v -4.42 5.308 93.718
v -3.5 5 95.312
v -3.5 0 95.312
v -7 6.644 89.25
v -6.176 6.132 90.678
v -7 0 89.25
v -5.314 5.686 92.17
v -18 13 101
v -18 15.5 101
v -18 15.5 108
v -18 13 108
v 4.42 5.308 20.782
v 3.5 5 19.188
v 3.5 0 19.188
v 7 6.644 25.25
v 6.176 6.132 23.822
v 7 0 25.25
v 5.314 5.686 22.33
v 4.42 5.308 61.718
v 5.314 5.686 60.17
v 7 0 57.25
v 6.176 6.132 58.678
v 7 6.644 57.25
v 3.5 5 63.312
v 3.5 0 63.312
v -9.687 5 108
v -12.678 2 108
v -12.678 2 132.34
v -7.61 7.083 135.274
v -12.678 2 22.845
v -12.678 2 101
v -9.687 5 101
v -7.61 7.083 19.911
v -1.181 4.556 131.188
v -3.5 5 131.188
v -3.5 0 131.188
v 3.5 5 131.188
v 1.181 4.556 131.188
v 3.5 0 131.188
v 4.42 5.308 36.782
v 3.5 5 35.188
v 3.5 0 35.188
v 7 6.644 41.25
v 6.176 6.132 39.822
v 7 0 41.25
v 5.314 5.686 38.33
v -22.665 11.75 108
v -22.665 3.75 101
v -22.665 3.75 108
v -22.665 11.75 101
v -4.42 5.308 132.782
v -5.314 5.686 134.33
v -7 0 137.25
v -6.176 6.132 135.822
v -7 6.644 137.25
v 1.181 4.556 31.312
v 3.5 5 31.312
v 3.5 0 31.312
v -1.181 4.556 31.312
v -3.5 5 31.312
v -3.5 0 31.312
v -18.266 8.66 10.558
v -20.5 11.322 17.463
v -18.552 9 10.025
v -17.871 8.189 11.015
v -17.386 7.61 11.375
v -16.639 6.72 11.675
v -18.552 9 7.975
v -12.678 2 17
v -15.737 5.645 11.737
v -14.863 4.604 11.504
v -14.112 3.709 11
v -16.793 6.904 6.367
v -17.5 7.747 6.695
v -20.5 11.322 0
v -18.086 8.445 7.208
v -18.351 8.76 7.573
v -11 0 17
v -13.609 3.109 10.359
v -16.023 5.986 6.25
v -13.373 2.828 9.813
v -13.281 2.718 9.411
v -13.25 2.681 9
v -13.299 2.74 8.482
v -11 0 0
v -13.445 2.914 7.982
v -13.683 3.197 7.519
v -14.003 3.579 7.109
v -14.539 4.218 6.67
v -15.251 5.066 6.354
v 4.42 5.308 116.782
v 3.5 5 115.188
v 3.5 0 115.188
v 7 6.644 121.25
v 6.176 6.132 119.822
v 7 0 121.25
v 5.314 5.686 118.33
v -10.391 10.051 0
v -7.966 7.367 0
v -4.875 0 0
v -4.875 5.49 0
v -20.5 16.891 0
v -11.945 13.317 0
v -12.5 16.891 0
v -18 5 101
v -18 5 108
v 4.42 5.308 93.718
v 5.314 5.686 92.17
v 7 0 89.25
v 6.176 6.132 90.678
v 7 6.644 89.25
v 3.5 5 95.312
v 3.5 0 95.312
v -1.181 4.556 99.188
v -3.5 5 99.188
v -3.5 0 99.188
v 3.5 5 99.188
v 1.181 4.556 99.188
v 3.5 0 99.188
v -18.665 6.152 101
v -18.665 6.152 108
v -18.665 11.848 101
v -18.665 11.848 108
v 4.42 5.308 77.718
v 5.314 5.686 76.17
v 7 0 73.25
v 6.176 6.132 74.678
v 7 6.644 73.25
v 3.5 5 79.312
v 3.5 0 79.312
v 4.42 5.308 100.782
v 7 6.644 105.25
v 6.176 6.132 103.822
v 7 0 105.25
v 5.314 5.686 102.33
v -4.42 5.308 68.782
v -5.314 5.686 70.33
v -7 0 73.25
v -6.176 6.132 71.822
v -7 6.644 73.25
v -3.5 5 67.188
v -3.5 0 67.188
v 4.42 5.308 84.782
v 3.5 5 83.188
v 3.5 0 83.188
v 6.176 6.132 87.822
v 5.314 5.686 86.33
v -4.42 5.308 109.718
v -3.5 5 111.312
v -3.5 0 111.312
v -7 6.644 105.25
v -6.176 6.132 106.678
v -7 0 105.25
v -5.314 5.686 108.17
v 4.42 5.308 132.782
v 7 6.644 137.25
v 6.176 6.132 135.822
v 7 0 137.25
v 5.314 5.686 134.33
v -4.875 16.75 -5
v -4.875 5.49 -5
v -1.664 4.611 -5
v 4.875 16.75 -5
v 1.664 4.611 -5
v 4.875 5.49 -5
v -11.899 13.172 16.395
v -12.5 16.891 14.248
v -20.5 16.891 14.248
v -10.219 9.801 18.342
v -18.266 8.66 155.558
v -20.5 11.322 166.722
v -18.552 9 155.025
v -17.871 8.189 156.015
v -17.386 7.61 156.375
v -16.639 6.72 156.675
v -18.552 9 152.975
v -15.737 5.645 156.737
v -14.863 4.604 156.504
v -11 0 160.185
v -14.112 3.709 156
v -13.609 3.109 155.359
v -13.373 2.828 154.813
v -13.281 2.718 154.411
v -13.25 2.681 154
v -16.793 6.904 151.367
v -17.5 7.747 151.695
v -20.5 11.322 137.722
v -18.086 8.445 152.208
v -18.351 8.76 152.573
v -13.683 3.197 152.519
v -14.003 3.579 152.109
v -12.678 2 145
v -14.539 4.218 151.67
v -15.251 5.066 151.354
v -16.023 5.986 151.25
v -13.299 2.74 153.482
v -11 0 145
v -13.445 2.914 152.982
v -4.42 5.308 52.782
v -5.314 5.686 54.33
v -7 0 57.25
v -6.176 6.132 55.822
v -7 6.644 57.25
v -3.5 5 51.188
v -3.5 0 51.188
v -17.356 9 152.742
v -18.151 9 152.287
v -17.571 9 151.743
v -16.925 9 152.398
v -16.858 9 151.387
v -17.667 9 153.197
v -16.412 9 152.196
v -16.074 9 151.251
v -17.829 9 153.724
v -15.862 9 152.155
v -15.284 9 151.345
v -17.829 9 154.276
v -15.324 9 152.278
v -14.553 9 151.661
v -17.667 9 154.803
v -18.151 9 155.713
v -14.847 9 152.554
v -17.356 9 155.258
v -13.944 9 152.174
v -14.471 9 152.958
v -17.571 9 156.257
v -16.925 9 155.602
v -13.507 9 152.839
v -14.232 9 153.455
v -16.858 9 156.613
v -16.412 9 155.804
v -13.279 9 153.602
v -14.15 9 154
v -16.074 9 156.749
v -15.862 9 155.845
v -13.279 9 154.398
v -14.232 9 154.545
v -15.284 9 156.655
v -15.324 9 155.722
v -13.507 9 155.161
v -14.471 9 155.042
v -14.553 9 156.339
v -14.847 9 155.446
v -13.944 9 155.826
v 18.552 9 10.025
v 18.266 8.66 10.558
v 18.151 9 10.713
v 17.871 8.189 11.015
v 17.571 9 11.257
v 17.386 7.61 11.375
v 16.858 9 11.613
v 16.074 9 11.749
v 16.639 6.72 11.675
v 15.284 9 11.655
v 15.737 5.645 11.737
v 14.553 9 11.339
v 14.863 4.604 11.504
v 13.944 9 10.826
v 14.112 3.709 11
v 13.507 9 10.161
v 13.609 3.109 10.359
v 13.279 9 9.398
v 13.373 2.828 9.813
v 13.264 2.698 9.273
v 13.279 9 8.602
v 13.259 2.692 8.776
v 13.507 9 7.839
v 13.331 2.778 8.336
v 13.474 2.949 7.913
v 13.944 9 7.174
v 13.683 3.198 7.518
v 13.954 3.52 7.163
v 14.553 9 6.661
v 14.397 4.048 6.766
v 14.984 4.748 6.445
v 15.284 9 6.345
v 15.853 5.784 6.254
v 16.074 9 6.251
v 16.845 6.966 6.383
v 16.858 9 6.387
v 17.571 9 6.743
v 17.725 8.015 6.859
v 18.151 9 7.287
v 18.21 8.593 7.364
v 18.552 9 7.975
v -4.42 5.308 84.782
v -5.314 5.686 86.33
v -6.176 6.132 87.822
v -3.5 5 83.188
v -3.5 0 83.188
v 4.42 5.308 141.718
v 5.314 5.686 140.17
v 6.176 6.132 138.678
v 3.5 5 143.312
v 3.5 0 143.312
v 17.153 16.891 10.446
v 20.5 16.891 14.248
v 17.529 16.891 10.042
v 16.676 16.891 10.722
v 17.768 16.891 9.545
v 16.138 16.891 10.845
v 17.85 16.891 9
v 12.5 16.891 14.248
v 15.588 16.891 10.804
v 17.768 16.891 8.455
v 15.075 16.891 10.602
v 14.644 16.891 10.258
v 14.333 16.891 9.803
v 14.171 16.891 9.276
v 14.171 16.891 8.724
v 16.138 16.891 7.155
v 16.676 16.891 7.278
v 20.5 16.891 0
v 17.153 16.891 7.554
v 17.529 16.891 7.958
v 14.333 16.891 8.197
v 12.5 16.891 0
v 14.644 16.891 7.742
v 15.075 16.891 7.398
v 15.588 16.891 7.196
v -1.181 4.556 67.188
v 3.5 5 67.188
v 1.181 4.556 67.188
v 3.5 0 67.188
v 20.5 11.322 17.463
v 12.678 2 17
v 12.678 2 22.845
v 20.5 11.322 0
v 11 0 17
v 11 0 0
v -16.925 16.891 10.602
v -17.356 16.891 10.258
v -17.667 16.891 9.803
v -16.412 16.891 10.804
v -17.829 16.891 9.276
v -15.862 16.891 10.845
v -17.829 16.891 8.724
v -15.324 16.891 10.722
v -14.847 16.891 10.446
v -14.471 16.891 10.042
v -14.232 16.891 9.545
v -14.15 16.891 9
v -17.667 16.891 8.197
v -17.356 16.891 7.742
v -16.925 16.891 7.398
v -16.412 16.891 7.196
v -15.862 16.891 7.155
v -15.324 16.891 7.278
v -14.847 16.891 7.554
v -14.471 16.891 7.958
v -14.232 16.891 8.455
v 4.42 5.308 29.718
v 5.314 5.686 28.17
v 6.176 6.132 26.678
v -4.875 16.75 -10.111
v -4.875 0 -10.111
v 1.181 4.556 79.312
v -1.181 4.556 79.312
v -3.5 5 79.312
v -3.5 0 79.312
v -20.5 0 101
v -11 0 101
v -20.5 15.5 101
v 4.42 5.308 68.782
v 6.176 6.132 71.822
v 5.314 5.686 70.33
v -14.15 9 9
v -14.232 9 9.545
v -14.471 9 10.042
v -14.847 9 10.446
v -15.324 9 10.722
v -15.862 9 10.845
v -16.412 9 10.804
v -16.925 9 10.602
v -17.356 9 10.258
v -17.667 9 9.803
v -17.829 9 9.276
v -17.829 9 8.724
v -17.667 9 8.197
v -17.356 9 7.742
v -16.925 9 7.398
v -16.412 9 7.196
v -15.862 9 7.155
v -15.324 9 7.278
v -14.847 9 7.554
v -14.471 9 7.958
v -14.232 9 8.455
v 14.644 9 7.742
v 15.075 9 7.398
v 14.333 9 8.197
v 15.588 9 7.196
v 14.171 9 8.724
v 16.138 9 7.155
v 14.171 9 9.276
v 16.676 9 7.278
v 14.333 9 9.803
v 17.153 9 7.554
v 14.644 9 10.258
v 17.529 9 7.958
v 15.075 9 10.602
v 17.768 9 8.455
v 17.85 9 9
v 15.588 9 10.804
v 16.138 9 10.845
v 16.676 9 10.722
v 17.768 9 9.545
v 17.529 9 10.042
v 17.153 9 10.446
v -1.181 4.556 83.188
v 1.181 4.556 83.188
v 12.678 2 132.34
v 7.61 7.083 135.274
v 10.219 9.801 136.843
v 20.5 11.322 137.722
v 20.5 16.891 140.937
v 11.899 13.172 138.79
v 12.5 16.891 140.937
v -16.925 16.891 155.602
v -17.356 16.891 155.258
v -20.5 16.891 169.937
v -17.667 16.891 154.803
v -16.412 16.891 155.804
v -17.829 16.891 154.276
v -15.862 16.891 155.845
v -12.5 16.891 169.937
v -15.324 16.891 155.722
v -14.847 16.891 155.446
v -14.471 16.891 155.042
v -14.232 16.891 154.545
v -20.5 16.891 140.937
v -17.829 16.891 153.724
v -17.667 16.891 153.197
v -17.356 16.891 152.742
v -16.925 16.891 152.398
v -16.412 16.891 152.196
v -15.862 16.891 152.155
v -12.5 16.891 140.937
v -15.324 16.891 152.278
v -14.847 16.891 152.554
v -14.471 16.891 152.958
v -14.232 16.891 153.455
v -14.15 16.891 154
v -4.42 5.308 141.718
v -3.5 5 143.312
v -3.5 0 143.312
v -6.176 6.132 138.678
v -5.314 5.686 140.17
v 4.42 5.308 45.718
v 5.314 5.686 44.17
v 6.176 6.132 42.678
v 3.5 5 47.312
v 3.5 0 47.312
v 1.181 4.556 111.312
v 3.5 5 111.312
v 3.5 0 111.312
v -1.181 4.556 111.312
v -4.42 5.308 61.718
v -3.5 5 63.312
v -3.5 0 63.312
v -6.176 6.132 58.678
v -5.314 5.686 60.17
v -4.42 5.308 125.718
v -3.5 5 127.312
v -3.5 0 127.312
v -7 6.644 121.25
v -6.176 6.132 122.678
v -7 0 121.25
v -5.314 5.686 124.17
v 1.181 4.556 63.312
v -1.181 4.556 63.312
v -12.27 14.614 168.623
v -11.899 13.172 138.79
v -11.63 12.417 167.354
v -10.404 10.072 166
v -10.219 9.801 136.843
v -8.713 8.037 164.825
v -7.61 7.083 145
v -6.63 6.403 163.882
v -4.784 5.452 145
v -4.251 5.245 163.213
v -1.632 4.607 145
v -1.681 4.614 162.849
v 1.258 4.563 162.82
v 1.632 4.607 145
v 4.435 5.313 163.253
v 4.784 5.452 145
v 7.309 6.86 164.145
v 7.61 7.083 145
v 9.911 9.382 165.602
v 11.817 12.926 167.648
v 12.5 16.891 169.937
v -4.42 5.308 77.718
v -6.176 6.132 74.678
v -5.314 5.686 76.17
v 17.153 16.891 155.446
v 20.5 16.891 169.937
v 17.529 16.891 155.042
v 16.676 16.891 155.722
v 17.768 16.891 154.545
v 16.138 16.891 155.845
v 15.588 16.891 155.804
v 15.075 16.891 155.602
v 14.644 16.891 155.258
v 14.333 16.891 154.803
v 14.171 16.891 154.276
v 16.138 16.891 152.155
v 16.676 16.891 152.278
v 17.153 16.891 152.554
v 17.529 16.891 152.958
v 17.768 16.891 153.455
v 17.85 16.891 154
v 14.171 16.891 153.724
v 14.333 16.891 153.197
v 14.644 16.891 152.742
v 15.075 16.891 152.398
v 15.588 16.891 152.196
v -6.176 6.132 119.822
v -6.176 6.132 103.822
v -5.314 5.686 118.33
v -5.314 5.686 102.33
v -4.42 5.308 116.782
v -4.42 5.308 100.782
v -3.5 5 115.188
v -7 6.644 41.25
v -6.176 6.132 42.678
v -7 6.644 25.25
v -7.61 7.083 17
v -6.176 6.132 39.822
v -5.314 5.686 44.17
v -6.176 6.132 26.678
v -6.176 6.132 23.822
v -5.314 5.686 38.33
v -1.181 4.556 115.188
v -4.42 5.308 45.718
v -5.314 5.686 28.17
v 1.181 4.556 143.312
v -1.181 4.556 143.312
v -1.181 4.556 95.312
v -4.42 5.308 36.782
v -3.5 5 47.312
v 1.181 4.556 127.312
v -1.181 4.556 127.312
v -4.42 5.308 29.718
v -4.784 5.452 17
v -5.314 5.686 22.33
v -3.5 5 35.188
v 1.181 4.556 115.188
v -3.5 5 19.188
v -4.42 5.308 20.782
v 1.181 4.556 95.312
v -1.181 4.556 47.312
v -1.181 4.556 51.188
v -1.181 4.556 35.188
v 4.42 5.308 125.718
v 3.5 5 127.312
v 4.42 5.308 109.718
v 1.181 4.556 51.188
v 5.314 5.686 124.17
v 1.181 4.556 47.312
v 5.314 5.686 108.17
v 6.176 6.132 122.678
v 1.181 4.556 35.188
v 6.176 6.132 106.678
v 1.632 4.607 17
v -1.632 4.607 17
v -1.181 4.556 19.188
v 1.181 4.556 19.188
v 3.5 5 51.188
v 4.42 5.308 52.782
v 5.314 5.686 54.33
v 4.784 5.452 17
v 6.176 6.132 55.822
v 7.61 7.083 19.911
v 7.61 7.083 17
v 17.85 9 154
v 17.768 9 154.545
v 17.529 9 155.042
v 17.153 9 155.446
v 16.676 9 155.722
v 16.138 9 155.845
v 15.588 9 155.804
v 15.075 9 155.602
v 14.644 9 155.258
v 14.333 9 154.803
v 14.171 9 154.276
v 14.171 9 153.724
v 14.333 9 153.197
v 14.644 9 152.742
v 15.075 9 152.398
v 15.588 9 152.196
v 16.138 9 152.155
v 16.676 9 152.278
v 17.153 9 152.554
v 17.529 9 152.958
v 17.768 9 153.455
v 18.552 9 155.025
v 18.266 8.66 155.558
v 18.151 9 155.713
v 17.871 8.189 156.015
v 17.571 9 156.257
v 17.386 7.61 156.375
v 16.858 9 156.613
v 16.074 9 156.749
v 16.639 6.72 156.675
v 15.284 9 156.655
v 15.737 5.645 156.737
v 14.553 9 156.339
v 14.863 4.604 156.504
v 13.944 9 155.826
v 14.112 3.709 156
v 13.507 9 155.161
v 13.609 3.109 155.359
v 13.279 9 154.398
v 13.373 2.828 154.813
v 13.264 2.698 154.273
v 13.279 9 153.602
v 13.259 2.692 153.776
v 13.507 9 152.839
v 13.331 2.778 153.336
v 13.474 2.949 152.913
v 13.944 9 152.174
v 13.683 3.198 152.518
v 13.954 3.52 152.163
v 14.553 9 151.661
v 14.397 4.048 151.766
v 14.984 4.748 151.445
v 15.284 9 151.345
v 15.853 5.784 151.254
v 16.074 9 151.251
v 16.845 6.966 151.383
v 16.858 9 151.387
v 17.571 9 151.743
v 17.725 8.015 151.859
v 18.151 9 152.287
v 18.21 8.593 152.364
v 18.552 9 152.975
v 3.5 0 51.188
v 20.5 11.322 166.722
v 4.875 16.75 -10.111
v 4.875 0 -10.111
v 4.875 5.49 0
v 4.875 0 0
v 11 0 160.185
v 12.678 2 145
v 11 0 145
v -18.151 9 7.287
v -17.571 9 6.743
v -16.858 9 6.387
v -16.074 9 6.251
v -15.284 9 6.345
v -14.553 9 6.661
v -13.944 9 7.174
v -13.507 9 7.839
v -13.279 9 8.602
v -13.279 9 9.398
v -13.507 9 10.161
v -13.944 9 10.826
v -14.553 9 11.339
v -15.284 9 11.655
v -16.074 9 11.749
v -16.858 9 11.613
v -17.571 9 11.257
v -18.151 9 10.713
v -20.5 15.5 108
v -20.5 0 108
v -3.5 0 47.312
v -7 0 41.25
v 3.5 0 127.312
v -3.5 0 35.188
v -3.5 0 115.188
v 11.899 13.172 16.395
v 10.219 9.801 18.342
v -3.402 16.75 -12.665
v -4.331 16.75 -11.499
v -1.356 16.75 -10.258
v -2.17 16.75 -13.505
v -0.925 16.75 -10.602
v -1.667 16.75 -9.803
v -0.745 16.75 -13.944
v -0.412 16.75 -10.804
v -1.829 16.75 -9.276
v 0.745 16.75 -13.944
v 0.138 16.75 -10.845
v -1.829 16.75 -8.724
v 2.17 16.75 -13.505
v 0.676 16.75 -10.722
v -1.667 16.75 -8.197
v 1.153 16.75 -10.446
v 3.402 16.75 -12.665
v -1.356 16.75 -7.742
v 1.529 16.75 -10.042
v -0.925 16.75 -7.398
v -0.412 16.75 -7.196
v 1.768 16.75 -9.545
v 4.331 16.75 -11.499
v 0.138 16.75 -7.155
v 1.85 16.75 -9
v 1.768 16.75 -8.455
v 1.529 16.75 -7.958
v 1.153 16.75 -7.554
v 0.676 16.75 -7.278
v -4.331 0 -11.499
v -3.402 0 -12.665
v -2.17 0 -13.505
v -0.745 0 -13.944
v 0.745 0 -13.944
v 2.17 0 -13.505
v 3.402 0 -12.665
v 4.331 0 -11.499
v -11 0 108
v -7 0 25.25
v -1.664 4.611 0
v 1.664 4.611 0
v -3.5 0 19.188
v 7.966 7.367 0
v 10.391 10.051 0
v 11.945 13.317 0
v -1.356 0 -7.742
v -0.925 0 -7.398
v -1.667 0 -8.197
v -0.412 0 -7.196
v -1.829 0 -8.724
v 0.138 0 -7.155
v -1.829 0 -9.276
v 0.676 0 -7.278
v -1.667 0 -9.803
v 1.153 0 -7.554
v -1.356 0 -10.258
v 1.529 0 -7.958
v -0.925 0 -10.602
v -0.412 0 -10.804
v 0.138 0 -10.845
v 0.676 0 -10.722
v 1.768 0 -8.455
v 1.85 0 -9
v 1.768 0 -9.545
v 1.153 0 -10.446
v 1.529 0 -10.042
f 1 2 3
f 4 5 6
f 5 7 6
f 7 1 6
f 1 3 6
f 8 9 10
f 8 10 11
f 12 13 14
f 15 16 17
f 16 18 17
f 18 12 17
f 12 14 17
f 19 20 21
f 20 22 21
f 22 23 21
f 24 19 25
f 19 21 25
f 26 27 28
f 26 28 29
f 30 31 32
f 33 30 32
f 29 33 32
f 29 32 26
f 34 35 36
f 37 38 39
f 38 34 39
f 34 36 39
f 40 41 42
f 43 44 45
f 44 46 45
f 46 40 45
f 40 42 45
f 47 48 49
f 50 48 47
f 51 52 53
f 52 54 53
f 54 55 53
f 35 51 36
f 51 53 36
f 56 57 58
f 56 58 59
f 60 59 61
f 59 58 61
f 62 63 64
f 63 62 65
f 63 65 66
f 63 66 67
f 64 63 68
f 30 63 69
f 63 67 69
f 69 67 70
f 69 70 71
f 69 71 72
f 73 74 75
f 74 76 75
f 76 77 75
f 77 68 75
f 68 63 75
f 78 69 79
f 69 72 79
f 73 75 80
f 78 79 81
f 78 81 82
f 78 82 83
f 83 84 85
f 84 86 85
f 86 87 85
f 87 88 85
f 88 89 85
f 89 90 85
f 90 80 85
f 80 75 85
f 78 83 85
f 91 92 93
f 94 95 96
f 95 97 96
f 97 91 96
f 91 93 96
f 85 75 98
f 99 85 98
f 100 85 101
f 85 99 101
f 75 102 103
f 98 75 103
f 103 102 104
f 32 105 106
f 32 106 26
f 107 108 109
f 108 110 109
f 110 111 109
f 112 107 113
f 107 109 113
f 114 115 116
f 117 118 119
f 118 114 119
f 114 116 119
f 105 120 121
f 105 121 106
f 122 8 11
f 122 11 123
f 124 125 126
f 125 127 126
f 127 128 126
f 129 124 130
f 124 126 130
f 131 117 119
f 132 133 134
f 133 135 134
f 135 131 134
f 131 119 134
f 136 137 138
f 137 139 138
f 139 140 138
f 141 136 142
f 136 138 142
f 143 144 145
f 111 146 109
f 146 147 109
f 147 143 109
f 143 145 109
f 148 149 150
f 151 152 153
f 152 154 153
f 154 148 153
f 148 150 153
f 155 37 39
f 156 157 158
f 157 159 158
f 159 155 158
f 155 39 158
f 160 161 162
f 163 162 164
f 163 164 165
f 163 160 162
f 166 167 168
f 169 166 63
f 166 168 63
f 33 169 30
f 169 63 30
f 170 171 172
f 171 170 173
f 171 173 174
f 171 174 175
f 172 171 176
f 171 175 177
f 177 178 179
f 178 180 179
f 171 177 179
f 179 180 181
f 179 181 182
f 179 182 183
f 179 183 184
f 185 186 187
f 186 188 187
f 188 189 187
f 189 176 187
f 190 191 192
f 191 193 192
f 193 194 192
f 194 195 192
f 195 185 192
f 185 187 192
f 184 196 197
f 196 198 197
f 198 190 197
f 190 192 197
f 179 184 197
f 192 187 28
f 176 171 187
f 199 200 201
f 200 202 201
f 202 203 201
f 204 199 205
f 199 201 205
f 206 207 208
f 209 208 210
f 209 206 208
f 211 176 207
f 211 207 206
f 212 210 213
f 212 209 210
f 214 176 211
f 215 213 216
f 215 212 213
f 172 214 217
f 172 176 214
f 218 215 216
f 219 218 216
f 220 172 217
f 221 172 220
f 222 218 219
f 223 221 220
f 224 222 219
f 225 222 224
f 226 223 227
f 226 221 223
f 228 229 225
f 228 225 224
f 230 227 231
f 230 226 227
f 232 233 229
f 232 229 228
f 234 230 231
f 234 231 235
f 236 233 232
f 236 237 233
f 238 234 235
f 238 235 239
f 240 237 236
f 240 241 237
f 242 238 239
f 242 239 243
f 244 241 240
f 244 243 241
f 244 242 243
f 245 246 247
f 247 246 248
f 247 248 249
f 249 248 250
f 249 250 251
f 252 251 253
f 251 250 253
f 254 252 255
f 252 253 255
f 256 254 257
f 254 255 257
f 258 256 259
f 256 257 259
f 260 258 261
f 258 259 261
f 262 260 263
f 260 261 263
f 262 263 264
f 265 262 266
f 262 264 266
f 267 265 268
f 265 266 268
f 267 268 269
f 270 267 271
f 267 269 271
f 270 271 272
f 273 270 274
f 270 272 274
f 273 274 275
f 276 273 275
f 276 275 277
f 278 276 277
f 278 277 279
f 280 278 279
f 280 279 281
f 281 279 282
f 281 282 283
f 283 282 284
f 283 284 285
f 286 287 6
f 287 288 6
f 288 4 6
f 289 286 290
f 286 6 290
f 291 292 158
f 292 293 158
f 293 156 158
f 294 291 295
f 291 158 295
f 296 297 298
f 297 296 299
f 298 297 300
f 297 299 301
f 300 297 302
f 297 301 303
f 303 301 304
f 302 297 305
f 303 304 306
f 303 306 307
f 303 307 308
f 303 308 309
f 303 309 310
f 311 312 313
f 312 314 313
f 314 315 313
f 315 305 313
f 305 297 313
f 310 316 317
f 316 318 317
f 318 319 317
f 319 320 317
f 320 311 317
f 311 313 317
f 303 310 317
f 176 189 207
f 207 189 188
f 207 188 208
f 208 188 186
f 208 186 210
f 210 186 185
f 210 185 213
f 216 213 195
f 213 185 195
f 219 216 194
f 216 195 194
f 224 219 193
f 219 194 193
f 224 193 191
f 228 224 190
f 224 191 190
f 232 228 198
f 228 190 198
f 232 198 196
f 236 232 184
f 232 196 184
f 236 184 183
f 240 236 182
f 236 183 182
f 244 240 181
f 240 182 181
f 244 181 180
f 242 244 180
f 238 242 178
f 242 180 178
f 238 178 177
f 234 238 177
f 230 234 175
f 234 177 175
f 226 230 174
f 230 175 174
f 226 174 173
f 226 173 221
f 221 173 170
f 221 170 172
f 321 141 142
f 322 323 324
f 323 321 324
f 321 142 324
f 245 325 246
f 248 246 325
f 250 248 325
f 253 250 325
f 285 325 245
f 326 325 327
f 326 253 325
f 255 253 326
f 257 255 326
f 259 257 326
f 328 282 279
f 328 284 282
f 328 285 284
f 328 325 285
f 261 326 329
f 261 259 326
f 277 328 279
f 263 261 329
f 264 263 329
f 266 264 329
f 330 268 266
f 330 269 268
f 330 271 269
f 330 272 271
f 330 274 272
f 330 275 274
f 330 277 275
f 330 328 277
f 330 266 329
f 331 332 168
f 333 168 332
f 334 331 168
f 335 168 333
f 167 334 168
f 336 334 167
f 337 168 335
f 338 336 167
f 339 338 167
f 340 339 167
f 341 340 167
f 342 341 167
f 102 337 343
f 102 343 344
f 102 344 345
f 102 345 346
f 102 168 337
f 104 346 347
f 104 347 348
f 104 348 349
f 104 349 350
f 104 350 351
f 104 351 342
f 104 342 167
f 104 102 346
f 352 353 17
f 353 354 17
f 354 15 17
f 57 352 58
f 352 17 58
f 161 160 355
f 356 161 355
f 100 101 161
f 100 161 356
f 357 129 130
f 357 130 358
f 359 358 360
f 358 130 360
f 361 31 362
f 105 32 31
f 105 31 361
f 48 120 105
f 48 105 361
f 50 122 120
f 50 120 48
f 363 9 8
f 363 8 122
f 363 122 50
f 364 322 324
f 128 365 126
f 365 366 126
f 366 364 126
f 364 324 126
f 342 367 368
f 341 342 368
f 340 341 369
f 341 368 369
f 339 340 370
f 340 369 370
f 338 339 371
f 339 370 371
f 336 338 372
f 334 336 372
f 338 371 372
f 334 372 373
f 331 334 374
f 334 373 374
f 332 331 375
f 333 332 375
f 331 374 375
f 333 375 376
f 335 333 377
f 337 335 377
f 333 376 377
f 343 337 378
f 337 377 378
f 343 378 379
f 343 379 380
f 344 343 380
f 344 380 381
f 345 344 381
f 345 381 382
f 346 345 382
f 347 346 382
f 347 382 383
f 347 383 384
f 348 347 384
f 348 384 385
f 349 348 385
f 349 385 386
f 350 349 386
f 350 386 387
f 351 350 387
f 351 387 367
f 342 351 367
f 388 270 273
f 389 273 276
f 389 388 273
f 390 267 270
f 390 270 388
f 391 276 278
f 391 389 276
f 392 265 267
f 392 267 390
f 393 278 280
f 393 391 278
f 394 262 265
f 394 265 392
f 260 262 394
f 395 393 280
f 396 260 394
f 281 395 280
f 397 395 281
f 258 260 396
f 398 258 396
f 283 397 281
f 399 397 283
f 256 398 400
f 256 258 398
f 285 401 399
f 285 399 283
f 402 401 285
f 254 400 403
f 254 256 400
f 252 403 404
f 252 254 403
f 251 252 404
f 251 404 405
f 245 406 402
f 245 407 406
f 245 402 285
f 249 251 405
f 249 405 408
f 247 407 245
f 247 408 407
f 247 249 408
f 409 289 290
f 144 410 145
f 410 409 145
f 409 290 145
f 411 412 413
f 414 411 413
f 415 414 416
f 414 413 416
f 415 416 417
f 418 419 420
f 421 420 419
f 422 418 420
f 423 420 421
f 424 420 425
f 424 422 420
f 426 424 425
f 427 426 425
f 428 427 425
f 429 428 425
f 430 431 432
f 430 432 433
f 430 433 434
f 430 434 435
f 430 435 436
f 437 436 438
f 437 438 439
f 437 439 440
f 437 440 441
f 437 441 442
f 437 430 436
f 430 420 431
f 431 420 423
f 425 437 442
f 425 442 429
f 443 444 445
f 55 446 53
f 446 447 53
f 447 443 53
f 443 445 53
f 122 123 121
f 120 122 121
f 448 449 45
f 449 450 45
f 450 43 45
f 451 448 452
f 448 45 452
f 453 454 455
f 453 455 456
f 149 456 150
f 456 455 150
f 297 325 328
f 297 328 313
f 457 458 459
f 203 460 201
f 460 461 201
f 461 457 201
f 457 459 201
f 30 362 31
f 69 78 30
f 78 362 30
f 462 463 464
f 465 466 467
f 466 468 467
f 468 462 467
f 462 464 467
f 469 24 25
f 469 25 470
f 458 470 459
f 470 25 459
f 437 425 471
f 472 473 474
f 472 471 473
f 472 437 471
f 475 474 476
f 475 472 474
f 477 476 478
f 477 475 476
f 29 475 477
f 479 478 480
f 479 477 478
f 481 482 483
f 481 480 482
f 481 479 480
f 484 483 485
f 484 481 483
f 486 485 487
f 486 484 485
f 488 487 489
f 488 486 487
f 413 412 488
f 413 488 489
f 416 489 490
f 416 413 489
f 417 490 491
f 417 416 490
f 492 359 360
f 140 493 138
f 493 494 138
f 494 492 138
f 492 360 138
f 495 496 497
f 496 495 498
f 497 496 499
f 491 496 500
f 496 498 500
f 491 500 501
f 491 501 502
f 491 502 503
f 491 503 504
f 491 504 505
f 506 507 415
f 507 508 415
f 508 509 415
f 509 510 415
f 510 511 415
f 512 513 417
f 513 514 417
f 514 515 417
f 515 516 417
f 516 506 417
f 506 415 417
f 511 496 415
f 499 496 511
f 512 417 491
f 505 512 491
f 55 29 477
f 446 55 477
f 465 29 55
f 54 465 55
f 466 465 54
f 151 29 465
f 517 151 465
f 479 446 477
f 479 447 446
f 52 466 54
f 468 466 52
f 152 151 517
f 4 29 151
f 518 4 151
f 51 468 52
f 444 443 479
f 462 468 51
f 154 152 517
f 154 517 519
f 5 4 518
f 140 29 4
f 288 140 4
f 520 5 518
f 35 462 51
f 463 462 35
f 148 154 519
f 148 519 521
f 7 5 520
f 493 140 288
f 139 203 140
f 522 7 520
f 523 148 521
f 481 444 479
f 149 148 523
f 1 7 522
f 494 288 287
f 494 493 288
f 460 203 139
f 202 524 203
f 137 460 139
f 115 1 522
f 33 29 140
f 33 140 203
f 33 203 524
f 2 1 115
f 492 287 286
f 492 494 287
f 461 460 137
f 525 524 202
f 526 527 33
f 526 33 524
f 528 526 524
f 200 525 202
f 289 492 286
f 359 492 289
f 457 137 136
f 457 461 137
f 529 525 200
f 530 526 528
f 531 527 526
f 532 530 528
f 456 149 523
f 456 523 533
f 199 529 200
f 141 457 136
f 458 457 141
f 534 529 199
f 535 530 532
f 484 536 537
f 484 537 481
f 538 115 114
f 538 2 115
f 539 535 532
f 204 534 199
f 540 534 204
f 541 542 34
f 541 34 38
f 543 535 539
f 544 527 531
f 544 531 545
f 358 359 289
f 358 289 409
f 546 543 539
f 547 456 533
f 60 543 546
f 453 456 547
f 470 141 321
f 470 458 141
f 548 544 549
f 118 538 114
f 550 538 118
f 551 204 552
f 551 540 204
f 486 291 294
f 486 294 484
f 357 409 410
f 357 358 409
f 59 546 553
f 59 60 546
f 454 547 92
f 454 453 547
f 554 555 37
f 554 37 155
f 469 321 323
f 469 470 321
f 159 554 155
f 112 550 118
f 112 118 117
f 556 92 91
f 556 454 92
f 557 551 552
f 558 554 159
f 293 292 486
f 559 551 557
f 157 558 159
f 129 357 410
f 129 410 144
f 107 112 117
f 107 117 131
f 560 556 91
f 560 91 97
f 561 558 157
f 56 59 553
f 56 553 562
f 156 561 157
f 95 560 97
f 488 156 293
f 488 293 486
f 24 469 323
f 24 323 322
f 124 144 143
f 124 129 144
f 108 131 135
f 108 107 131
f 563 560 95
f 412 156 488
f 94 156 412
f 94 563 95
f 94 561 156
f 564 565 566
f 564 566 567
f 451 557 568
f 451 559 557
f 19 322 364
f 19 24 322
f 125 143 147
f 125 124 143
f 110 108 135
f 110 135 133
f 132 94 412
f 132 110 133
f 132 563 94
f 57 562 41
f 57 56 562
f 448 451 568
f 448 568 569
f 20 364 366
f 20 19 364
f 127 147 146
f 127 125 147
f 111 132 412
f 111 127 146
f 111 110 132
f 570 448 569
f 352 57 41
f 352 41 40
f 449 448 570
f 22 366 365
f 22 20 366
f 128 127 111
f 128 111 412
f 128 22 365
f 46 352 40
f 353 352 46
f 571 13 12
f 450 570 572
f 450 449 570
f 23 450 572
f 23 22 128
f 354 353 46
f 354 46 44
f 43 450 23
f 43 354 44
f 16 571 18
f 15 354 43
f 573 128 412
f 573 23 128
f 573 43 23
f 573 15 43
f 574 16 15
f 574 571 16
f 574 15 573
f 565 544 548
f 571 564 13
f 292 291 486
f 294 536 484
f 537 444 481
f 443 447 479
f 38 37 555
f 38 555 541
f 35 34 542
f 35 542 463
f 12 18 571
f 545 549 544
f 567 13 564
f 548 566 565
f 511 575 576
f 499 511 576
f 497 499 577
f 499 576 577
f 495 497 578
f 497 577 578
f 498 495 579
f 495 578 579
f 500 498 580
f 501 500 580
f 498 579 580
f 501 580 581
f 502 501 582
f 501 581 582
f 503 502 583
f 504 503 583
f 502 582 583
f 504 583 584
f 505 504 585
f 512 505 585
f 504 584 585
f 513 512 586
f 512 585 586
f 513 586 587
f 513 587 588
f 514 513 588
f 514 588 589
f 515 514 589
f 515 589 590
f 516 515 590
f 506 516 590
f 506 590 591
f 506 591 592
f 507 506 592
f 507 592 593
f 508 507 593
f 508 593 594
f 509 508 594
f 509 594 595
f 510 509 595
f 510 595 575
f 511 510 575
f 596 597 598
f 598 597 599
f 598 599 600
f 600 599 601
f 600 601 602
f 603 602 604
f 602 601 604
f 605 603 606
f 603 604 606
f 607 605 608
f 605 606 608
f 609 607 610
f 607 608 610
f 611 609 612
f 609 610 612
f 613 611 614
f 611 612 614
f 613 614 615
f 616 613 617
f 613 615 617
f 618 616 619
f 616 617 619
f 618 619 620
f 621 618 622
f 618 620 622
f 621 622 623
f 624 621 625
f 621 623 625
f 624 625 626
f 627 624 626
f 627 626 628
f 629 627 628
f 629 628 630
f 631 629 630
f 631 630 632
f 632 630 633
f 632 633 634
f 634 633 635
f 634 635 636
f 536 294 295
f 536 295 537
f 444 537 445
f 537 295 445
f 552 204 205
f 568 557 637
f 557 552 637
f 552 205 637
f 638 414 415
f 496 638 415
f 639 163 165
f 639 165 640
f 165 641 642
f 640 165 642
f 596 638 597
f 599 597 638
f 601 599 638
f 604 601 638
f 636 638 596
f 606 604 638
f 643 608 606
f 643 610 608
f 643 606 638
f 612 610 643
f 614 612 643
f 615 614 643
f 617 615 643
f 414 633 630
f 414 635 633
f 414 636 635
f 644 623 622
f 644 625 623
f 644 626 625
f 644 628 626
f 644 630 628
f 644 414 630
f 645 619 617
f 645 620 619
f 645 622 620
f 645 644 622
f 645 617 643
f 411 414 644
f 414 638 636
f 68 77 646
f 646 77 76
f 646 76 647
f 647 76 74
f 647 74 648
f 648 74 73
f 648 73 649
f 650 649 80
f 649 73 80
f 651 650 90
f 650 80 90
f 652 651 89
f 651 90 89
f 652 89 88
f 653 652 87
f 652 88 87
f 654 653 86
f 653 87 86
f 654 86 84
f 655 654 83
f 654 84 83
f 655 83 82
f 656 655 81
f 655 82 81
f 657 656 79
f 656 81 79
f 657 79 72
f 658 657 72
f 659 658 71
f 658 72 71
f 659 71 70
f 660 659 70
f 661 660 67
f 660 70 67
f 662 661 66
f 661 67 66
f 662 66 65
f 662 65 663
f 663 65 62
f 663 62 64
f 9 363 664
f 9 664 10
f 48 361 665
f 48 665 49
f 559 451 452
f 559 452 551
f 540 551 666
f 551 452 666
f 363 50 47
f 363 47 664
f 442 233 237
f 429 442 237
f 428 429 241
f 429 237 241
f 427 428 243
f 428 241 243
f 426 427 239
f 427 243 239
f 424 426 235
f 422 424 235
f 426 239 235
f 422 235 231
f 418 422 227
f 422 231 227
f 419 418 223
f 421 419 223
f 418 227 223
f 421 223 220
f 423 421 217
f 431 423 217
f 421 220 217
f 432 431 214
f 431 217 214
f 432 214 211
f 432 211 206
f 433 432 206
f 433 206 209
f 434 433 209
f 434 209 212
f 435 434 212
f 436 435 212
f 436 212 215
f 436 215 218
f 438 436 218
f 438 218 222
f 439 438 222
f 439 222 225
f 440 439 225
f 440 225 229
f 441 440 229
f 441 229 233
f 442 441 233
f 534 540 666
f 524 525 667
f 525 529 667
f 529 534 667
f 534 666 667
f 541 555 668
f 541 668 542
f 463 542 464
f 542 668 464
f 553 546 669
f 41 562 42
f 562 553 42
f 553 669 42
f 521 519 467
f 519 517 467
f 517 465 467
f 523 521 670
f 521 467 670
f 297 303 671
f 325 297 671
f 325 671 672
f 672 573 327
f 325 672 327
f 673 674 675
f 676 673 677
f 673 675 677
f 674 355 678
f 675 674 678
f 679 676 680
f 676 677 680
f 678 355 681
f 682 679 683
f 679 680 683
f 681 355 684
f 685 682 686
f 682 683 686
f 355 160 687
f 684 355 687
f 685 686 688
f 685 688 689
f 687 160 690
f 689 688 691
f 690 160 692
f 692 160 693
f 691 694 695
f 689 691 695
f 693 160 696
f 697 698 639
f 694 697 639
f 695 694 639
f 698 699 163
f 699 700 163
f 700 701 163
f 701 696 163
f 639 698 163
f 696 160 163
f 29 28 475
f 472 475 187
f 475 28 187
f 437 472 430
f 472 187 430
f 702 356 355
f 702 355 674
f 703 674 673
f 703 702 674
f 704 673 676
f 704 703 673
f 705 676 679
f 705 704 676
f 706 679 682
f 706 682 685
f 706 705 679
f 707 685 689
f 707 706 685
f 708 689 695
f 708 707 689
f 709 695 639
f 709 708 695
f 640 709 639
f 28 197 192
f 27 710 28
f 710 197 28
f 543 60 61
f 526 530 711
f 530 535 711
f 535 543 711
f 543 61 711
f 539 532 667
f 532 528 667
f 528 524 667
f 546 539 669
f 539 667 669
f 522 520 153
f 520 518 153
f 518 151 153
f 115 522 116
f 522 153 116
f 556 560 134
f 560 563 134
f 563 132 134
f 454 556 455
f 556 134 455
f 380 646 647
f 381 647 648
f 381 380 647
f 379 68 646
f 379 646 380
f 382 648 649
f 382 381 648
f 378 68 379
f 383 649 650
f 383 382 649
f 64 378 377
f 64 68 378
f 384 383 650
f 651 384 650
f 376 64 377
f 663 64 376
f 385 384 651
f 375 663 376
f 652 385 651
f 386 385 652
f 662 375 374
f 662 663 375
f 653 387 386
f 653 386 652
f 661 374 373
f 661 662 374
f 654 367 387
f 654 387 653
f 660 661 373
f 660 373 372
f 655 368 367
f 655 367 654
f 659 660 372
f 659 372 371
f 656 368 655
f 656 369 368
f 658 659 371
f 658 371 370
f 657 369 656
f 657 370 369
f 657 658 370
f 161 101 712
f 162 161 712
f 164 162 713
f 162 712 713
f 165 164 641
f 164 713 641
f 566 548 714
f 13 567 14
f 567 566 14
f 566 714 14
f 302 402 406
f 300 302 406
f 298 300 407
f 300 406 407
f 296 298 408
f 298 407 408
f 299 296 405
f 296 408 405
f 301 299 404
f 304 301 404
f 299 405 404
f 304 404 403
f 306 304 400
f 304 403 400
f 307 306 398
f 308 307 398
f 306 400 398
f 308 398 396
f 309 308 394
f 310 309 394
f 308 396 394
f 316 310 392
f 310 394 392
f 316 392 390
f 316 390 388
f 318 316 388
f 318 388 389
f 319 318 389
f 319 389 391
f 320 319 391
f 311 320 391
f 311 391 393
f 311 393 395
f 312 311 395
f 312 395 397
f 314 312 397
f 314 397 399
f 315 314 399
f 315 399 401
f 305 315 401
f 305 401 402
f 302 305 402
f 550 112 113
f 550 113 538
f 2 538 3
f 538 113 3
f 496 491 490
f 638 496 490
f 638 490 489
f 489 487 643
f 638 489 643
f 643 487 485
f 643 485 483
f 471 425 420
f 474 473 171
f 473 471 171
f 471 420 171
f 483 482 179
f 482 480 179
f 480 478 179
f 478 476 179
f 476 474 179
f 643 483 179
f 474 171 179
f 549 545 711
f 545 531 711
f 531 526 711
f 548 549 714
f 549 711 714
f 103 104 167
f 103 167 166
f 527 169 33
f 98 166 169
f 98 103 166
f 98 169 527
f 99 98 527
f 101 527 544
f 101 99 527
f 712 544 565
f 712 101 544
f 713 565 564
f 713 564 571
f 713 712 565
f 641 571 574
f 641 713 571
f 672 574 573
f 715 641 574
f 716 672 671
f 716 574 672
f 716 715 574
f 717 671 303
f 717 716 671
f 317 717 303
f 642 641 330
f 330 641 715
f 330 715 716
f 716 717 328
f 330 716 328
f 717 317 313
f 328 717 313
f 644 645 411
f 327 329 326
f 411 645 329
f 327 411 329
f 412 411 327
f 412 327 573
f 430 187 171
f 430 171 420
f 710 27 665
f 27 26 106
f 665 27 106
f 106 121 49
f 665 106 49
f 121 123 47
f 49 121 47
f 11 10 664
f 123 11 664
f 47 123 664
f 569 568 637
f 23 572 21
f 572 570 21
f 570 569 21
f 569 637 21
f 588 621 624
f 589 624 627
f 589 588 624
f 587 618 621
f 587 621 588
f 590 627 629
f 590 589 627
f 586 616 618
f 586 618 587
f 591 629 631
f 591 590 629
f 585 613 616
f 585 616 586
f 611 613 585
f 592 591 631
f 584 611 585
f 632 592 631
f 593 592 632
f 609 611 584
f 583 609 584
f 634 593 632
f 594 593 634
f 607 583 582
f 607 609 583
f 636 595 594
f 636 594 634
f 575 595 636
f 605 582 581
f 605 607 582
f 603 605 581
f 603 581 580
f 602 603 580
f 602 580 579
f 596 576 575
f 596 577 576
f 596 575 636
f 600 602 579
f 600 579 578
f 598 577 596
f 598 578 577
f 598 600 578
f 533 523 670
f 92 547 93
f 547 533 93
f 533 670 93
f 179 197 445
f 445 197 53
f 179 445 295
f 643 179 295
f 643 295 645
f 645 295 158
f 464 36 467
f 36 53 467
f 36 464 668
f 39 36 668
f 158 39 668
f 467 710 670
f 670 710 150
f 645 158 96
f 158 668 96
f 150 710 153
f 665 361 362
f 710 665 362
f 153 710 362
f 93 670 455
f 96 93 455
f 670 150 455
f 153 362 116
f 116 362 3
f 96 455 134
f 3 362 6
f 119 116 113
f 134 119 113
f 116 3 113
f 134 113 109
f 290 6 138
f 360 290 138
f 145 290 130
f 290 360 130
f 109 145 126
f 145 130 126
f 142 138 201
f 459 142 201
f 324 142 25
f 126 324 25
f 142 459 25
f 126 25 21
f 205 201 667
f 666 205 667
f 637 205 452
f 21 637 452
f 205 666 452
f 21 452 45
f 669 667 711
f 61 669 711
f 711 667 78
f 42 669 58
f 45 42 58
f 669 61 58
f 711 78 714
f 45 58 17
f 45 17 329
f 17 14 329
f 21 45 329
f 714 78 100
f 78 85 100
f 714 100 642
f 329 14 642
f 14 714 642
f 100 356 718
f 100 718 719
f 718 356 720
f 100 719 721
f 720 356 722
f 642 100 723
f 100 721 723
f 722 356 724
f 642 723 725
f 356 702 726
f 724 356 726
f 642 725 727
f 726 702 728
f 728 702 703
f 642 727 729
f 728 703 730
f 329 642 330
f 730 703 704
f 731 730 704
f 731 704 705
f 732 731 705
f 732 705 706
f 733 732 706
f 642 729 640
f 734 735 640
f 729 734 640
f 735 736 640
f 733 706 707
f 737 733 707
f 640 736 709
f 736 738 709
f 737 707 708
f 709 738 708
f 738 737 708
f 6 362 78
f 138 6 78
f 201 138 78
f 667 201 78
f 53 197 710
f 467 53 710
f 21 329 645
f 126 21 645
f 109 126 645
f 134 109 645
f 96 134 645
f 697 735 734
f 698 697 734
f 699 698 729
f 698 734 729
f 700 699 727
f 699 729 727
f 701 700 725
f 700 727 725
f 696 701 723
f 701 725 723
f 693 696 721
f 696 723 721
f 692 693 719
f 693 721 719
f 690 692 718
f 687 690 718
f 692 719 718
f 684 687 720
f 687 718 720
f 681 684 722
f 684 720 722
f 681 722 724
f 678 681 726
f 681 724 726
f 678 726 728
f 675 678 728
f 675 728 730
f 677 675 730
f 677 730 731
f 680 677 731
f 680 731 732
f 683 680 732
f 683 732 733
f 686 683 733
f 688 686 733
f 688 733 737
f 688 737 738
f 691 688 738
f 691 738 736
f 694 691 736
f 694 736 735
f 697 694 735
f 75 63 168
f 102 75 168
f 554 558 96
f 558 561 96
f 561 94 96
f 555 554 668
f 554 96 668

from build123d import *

# Parameters (mm, degrees)
SKETCH218_AS_DRAWN_R                    = 1.85
EXTRUDE136003_DEPTH                     = 20
EXTRUDE136003_ONTO_SKETCH218_ROLL_ANGLE = 90
EXTRUDE136010_DEPTH                     = 50
SKETCH221_AS_DRAWN_R                    = 2.75
EXTRUDE136006_DEPTH                     = 9
EXTRUDE136006_ONTO_SKETCH221_ROLL_ANGLE = 90
SKETCH220_AS_DRAWN_R                    = 1.85
EXTRUDE136005_DEPTH                     = 20
EXTRUDE136005_ONTO_SKETCH220_ROLL_ANGLE = 90
EXTRUDE136004_DEPTH                     = 38
EXTRUDE136011_DEPTH                     = 50
SKETCH224_AS_DRAWN_R                    = 2.75
EXTRUDE136009_DEPTH                     = 9
EXTRUDE136009_ONTO_SKETCH224_ROLL_ANGLE = 90
SKETCH223_AS_DRAWN_R                    = 1.85
EXTRUDE136008_DEPTH                     = 20
EXTRUDE136008_ONTO_SKETCH223_ROLL_ANGLE = 90
EXTRUDE136007_DEPTH                     = 24
EXTRUDE136012_DEPTH                     = 14
SKETCH227_W                             = 9.75
SKETCH227_H                             = 16.75
EXTRUDE136013_DEPTH                     = 9
EXTRUDE136014_DEPTH                     = 7
EXTRUDE136002_DEPTH                     = 128


with BuildPart() as extrude136003:
    # Sketch218 as drawn → Extrude136003 (new)
    with BuildSketch(Plane.XY):
        with Locations((0, -9)):
            Circle(SKETCH218_AS_DRAWN_R)
        Polygon((3.5, 19.187822), (7, 25.25), (3.5, 31.312178), (-3.5, 31.312178), (-7, 25.25), (-3.5, 19.187822), align=None)
        Polygon((3.5, 35.187822), (7, 41.25), (3.5, 47.312178), (-3.5, 47.312178), (-7, 41.25), (-3.5, 35.187822), align=None)
        Polygon((3.5, 51.187822), (7, 57.25), (3.5, 63.312178), (-3.5, 63.312178), (-7, 57.25), (-3.5, 51.187822), align=None)
        Polygon((3.5, 67.187822), (7, 73.25), (3.5, 79.312178), (-3.5, 79.312178), (-7, 73.25), (-3.5, 67.187822), align=None)
        Polygon((3.5, 83.187822), (7, 89.25), (3.5, 95.312178), (-3.5, 95.312178), (-7, 89.25), (-3.5, 83.187822), align=None)
        Polygon((3.5, 99.187822), (7, 105.25), (3.5, 111.312178), (-3.5, 111.312178), (-7, 105.25), (-3.5, 99.187822), align=None)
        Polygon((3.5, 115.187822), (7, 121.25), (3.5, 127.312178), (-3.5, 127.312178), (-7, 121.25), (-3.5, 115.187822), align=None)
        Polygon((3.5, 131.187822), (7, 137.25), (3.5, 143.312178), (-3.5, 143.312178), (-7, 137.25), (-3.5, 131.187822), align=None)
        with BuildLine():
            Line((5, -8.999981), (5, -15.999981))
            Line((5, -15.999981), (-5, -15.999981))
            Line((-5, -15.999981), (-5, -8.999981))
            ThreePointArc((-5, -8.999981), (0, -14), (5, -8.999981))
        make_face()
    extrude(amount=-EXTRUDE136003_DEPTH)


with BuildPart() as extrude136003_1:
    # Extrude136003 onto Sketch218 roll: moved
    add(extrude136003.part.rotate(Axis((0, 0, 0), (1, 0, 0)), EXTRUDE136003_ONTO_SKETCH218_ROLL_ANGLE))


with BuildPart() as extrude136003_2:
    # Extrude136003 onto Sketch218 placement: moved
    add(extrude136003_1.part)


with BuildPart() as extrude136010:
    # Sketch225 → Extrude136010 (new body)
    with BuildSketch(Plane.YZ):
        Polygon((0, -9.814955), (17, 0), (17, -9.814955), align=None)
        Polygon((17, 29), (0, 19.185045), (0, 29), align=None)
    extrude(amount=EXTRUDE136010_DEPTH)


with BuildPart() as extrude136010_1:
    # Extrude136010 placement: moved
    add(extrude136010.part.moved(Location((-25, 0, 0))))


with BuildPart() as extrude136006:
    # Sketch221 as drawn → Extrude136006 (new)
    with BuildSketch(Plane.XY):
        with Locations((-16, 0)):
            Circle(SKETCH221_AS_DRAWN_R)
        with Locations((16, 0)):
            Circle(SKETCH221_AS_DRAWN_R)
    extrude(amount=-EXTRUDE136006_DEPTH)


with BuildPart() as extrude136006_1:
    # Extrude136006 onto Sketch221 roll: moved
    add(extrude136006.part.rotate(Axis((0, 0, 0), (1, 0, 0)), EXTRUDE136006_ONTO_SKETCH221_ROLL_ANGLE))


with BuildPart() as extrude136006_2:
    # Extrude136006 onto Sketch221 placement: moved
    add(extrude136006_1.part)


with BuildPart() as fusion034004041035:
    # Sketch220 as drawn → Extrude136005 (new)
    with BuildSketch(Plane.XY):
        with Locations((-16, 0)):
            Circle(SKETCH220_AS_DRAWN_R)
        with Locations((16, 0)):
            Circle(SKETCH220_AS_DRAWN_R)
    extrude(amount=-EXTRUDE136005_DEPTH)


with BuildPart() as fusion034004041035_1:
    # Extrude136005 onto Sketch220 roll: moved
    add(fusion034004041035.part.rotate(Axis((0, 0, 0), (1, 0, 0)), EXTRUDE136005_ONTO_SKETCH220_ROLL_ANGLE))


with BuildPart() as fusion034004041035_2:
    # Extrude136005 onto Sketch220 placement: moved
    add(fusion034004041035_1.part)

    # Fusion034004041033: union Extrude136006
    add(extrude136006_2.part)


with BuildPart() as fusion034004041035_3:
    # Fusion034004041033 placement: moved
    add(fusion034004041035_2.part.moved(Location((0, 0, 13))))

    # Fusion034004041035: union Extrude136010
    add(extrude136010_1.part)


with BuildPart() as cut009010006006004:
    # Sketch219 → Extrude136004 (new body)
    with BuildSketch(Plane.XY):
        with BuildLine():
            Line((-11, 0), (11, 0))
            Line((20.5, 11.321659), (11, 0))
            Line((20.5, 11.321659), (20.5, 16.890918))
            Line((20.5, 16.890918), (12.499524, 16.890918))
            ThreePointArc((-12.499524, 16.890918), (0, 4.5), (12.499524, 16.890918))
            Line((-20.5, 16.890918), (-12.499524, 16.890918))
            Line((-20.5, 11.321659), (-20.5, 16.890918))
            Line((-20.5, 11.321659), (-11, 0))
        make_face()
    extrude(amount=EXTRUDE136004_DEPTH)


with BuildPart() as cut009010006006004_1:
    # Extrude136004 placement: moved
    add(cut009010006006004.part.moved(Location((0, 0, -9))))

    # Cut009010006006004: cut Fusion034004041035
    add(fusion034004041035_3.part, mode=Mode.SUBTRACT)


with BuildPart() as cut009010006006004_2:
    # Cut009010006006004 placement: moved
    add(cut009010006006004_1.part.moved(Location((0, 0, 141))))


with BuildPart() as extrude136011:
    # Sketch226 → Extrude136011 (new body)
    with BuildSketch(Plane.YZ):
        Polygon((0, 24), (17, 24), (17, 14.185045), align=None)
    extrude(amount=EXTRUDE136011_DEPTH)


with BuildPart() as extrude136011_1:
    # Extrude136011 placement: moved
    add(extrude136011.part.moved(Location((-25, 0, 0))))


with BuildPart() as extrude136009:
    # Sketch224 as drawn → Extrude136009 (new)
    with BuildSketch(Plane.XY):
        with Locations((-16, 0)):
            Circle(SKETCH224_AS_DRAWN_R)
        with Locations((16, 0)):
            Circle(SKETCH224_AS_DRAWN_R)
    extrude(amount=-EXTRUDE136009_DEPTH)


with BuildPart() as extrude136009_1:
    # Extrude136009 onto Sketch224 roll: moved
    add(extrude136009.part.rotate(Axis((0, 0, 0), (1, 0, 0)), EXTRUDE136009_ONTO_SKETCH224_ROLL_ANGLE))


with BuildPart() as extrude136009_2:
    # Extrude136009 onto Sketch224 placement: moved
    add(extrude136009_1.part)


with BuildPart() as fusion034004041034:
    # Sketch223 as drawn → Extrude136008 (new)
    with BuildSketch(Plane.XY):
        with Locations((-16, 0)):
            Circle(SKETCH223_AS_DRAWN_R)
        with Locations((16, 0)):
            Circle(SKETCH223_AS_DRAWN_R)
    extrude(amount=-EXTRUDE136008_DEPTH)


with BuildPart() as fusion034004041034_1:
    # Extrude136008 onto Sketch223 roll: moved
    add(fusion034004041034.part.rotate(Axis((0, 0, 0), (1, 0, 0)), EXTRUDE136008_ONTO_SKETCH223_ROLL_ANGLE))


with BuildPart() as fusion034004041034_2:
    # Extrude136008 onto Sketch223 placement: moved
    add(fusion034004041034_1.part)

    # Fusion034004041034: union Extrude136009
    add(extrude136009_2.part)


with BuildPart() as fusion034004041034_3:
    # Fusion034004041034 placement: moved
    add(fusion034004041034_2.part.moved(Location((0, 0, 9))))


with BuildPart() as cut009010006006005:
    # Sketch222 → Extrude136007 (new body)
    with BuildSketch(Plane.XY):
        with BuildLine():
            Line((-11, 0), (11, 0))
            Line((20.5, 11.321659), (11, 0))
            Line((20.5, 11.321659), (20.5, 16.890918))
            Line((20.5, 16.890918), (12.499524, 16.890918))
            ThreePointArc((-12.499524, 16.890918), (0, 4.5), (12.499524, 16.890918))
            Line((-20.5, 16.890918), (-12.499524, 16.890918))
            Line((-20.5, 11.321659), (-20.5, 16.890918))
            Line((-20.5, 11.321659), (-11, 0))
        make_face()
    extrude(amount=EXTRUDE136007_DEPTH)

    # Cut009010006006003: cut Fusion034004041034
    add(fusion034004041034_3.part, mode=Mode.SUBTRACT)

    # Cut009010006006005: cut Extrude136011
    add(extrude136011_1.part, mode=Mode.SUBTRACT)


with BuildPart() as extrude136012:
    # Sketch199 → Extrude136012 (new body)
    with BuildSketch(Plane.XY):
        with BuildLine():
            Line((-4.875, 0), (4.875, 0))
            Line((4.875, 5.489814), (4.875, 0))
            ThreePointArc((-4.875, 5.489814), (0, 4.5), (4.875, 5.489814))
            Line((-4.875, 5.489814), (-4.875, 0))
        make_face()
    extrude(amount=-EXTRUDE136012_DEPTH)


with BuildPart() as extrude136013:
    # Sketch227 → Extrude136013 (new body)
    with BuildSketch(Plane.XY):
        with Locations((0, 8.375)):
            Rectangle(SKETCH227_W, SKETCH227_H)
    extrude(amount=-EXTRUDE136013_DEPTH)


with BuildPart() as extrude136013_1:
    # Extrude136013 placement: moved
    add(extrude136013.part.moved(Location((0, 0, -5))))


with BuildPart() as extrude136014:
    # Sketch228 → Extrude136014 (new body)
    with BuildSketch(Plane.XY):
        Polygon((0, 5), (0, 0), (-20.5, 0), (-22.665064, 3.75), (-22.665064, 11.75), (-20.5, 15.5), (-18, 15.5), (-18, 13), (-18.665064, 11.848076), (-18.665064, 6.151924), (-18, 5), align=None)
    extrude(amount=EXTRUDE136014_DEPTH)


with BuildPart() as extrude136014_1:
    # Extrude136014 placement: moved
    add(extrude136014.part.moved(Location((0, 0, 101))))


with BuildPart() as cut009010006006006:
    # Sketch217 → Extrude136002 (new body)
    with BuildSketch(Plane.XY):
        with BuildLine():
            Line((-11, 0), (11, 0))
            Line((11, 0), (12.678199, 2))
            Line((12.678199, 2), (7.609518, 7.083083))
            ThreePointArc((-7.609518, 7.083083), (0, 4.5), (7.609518, 7.083083))
            Line((-12.678199, 2), (-7.609518, 7.083083))
            Line((-11, 0), (-12.678199, 2))
        make_face()
    extrude(amount=EXTRUDE136002_DEPTH)


with BuildPart() as cut009010006006006_1:
    # Extrude136002 placement: moved
    add(cut009010006006006.part.moved(Location((0, 0, 17))))

    # Fusion034004041036: union Cut009010006006004, Cut009010006006005, Extrude136012, Extrude136013, Extrude136014
    add(cut009010006006004_2.part)
    add(cut009010006006005.part)
    add(extrude136012.part)
    add(extrude136013_1.part)
    add(extrude136014_1.part)

    # Cut009010006006006: cut Extrude136003
    add(extrude136003_2.part, mode=Mode.SUBTRACT)


solid = cut009010006006006_1.part
